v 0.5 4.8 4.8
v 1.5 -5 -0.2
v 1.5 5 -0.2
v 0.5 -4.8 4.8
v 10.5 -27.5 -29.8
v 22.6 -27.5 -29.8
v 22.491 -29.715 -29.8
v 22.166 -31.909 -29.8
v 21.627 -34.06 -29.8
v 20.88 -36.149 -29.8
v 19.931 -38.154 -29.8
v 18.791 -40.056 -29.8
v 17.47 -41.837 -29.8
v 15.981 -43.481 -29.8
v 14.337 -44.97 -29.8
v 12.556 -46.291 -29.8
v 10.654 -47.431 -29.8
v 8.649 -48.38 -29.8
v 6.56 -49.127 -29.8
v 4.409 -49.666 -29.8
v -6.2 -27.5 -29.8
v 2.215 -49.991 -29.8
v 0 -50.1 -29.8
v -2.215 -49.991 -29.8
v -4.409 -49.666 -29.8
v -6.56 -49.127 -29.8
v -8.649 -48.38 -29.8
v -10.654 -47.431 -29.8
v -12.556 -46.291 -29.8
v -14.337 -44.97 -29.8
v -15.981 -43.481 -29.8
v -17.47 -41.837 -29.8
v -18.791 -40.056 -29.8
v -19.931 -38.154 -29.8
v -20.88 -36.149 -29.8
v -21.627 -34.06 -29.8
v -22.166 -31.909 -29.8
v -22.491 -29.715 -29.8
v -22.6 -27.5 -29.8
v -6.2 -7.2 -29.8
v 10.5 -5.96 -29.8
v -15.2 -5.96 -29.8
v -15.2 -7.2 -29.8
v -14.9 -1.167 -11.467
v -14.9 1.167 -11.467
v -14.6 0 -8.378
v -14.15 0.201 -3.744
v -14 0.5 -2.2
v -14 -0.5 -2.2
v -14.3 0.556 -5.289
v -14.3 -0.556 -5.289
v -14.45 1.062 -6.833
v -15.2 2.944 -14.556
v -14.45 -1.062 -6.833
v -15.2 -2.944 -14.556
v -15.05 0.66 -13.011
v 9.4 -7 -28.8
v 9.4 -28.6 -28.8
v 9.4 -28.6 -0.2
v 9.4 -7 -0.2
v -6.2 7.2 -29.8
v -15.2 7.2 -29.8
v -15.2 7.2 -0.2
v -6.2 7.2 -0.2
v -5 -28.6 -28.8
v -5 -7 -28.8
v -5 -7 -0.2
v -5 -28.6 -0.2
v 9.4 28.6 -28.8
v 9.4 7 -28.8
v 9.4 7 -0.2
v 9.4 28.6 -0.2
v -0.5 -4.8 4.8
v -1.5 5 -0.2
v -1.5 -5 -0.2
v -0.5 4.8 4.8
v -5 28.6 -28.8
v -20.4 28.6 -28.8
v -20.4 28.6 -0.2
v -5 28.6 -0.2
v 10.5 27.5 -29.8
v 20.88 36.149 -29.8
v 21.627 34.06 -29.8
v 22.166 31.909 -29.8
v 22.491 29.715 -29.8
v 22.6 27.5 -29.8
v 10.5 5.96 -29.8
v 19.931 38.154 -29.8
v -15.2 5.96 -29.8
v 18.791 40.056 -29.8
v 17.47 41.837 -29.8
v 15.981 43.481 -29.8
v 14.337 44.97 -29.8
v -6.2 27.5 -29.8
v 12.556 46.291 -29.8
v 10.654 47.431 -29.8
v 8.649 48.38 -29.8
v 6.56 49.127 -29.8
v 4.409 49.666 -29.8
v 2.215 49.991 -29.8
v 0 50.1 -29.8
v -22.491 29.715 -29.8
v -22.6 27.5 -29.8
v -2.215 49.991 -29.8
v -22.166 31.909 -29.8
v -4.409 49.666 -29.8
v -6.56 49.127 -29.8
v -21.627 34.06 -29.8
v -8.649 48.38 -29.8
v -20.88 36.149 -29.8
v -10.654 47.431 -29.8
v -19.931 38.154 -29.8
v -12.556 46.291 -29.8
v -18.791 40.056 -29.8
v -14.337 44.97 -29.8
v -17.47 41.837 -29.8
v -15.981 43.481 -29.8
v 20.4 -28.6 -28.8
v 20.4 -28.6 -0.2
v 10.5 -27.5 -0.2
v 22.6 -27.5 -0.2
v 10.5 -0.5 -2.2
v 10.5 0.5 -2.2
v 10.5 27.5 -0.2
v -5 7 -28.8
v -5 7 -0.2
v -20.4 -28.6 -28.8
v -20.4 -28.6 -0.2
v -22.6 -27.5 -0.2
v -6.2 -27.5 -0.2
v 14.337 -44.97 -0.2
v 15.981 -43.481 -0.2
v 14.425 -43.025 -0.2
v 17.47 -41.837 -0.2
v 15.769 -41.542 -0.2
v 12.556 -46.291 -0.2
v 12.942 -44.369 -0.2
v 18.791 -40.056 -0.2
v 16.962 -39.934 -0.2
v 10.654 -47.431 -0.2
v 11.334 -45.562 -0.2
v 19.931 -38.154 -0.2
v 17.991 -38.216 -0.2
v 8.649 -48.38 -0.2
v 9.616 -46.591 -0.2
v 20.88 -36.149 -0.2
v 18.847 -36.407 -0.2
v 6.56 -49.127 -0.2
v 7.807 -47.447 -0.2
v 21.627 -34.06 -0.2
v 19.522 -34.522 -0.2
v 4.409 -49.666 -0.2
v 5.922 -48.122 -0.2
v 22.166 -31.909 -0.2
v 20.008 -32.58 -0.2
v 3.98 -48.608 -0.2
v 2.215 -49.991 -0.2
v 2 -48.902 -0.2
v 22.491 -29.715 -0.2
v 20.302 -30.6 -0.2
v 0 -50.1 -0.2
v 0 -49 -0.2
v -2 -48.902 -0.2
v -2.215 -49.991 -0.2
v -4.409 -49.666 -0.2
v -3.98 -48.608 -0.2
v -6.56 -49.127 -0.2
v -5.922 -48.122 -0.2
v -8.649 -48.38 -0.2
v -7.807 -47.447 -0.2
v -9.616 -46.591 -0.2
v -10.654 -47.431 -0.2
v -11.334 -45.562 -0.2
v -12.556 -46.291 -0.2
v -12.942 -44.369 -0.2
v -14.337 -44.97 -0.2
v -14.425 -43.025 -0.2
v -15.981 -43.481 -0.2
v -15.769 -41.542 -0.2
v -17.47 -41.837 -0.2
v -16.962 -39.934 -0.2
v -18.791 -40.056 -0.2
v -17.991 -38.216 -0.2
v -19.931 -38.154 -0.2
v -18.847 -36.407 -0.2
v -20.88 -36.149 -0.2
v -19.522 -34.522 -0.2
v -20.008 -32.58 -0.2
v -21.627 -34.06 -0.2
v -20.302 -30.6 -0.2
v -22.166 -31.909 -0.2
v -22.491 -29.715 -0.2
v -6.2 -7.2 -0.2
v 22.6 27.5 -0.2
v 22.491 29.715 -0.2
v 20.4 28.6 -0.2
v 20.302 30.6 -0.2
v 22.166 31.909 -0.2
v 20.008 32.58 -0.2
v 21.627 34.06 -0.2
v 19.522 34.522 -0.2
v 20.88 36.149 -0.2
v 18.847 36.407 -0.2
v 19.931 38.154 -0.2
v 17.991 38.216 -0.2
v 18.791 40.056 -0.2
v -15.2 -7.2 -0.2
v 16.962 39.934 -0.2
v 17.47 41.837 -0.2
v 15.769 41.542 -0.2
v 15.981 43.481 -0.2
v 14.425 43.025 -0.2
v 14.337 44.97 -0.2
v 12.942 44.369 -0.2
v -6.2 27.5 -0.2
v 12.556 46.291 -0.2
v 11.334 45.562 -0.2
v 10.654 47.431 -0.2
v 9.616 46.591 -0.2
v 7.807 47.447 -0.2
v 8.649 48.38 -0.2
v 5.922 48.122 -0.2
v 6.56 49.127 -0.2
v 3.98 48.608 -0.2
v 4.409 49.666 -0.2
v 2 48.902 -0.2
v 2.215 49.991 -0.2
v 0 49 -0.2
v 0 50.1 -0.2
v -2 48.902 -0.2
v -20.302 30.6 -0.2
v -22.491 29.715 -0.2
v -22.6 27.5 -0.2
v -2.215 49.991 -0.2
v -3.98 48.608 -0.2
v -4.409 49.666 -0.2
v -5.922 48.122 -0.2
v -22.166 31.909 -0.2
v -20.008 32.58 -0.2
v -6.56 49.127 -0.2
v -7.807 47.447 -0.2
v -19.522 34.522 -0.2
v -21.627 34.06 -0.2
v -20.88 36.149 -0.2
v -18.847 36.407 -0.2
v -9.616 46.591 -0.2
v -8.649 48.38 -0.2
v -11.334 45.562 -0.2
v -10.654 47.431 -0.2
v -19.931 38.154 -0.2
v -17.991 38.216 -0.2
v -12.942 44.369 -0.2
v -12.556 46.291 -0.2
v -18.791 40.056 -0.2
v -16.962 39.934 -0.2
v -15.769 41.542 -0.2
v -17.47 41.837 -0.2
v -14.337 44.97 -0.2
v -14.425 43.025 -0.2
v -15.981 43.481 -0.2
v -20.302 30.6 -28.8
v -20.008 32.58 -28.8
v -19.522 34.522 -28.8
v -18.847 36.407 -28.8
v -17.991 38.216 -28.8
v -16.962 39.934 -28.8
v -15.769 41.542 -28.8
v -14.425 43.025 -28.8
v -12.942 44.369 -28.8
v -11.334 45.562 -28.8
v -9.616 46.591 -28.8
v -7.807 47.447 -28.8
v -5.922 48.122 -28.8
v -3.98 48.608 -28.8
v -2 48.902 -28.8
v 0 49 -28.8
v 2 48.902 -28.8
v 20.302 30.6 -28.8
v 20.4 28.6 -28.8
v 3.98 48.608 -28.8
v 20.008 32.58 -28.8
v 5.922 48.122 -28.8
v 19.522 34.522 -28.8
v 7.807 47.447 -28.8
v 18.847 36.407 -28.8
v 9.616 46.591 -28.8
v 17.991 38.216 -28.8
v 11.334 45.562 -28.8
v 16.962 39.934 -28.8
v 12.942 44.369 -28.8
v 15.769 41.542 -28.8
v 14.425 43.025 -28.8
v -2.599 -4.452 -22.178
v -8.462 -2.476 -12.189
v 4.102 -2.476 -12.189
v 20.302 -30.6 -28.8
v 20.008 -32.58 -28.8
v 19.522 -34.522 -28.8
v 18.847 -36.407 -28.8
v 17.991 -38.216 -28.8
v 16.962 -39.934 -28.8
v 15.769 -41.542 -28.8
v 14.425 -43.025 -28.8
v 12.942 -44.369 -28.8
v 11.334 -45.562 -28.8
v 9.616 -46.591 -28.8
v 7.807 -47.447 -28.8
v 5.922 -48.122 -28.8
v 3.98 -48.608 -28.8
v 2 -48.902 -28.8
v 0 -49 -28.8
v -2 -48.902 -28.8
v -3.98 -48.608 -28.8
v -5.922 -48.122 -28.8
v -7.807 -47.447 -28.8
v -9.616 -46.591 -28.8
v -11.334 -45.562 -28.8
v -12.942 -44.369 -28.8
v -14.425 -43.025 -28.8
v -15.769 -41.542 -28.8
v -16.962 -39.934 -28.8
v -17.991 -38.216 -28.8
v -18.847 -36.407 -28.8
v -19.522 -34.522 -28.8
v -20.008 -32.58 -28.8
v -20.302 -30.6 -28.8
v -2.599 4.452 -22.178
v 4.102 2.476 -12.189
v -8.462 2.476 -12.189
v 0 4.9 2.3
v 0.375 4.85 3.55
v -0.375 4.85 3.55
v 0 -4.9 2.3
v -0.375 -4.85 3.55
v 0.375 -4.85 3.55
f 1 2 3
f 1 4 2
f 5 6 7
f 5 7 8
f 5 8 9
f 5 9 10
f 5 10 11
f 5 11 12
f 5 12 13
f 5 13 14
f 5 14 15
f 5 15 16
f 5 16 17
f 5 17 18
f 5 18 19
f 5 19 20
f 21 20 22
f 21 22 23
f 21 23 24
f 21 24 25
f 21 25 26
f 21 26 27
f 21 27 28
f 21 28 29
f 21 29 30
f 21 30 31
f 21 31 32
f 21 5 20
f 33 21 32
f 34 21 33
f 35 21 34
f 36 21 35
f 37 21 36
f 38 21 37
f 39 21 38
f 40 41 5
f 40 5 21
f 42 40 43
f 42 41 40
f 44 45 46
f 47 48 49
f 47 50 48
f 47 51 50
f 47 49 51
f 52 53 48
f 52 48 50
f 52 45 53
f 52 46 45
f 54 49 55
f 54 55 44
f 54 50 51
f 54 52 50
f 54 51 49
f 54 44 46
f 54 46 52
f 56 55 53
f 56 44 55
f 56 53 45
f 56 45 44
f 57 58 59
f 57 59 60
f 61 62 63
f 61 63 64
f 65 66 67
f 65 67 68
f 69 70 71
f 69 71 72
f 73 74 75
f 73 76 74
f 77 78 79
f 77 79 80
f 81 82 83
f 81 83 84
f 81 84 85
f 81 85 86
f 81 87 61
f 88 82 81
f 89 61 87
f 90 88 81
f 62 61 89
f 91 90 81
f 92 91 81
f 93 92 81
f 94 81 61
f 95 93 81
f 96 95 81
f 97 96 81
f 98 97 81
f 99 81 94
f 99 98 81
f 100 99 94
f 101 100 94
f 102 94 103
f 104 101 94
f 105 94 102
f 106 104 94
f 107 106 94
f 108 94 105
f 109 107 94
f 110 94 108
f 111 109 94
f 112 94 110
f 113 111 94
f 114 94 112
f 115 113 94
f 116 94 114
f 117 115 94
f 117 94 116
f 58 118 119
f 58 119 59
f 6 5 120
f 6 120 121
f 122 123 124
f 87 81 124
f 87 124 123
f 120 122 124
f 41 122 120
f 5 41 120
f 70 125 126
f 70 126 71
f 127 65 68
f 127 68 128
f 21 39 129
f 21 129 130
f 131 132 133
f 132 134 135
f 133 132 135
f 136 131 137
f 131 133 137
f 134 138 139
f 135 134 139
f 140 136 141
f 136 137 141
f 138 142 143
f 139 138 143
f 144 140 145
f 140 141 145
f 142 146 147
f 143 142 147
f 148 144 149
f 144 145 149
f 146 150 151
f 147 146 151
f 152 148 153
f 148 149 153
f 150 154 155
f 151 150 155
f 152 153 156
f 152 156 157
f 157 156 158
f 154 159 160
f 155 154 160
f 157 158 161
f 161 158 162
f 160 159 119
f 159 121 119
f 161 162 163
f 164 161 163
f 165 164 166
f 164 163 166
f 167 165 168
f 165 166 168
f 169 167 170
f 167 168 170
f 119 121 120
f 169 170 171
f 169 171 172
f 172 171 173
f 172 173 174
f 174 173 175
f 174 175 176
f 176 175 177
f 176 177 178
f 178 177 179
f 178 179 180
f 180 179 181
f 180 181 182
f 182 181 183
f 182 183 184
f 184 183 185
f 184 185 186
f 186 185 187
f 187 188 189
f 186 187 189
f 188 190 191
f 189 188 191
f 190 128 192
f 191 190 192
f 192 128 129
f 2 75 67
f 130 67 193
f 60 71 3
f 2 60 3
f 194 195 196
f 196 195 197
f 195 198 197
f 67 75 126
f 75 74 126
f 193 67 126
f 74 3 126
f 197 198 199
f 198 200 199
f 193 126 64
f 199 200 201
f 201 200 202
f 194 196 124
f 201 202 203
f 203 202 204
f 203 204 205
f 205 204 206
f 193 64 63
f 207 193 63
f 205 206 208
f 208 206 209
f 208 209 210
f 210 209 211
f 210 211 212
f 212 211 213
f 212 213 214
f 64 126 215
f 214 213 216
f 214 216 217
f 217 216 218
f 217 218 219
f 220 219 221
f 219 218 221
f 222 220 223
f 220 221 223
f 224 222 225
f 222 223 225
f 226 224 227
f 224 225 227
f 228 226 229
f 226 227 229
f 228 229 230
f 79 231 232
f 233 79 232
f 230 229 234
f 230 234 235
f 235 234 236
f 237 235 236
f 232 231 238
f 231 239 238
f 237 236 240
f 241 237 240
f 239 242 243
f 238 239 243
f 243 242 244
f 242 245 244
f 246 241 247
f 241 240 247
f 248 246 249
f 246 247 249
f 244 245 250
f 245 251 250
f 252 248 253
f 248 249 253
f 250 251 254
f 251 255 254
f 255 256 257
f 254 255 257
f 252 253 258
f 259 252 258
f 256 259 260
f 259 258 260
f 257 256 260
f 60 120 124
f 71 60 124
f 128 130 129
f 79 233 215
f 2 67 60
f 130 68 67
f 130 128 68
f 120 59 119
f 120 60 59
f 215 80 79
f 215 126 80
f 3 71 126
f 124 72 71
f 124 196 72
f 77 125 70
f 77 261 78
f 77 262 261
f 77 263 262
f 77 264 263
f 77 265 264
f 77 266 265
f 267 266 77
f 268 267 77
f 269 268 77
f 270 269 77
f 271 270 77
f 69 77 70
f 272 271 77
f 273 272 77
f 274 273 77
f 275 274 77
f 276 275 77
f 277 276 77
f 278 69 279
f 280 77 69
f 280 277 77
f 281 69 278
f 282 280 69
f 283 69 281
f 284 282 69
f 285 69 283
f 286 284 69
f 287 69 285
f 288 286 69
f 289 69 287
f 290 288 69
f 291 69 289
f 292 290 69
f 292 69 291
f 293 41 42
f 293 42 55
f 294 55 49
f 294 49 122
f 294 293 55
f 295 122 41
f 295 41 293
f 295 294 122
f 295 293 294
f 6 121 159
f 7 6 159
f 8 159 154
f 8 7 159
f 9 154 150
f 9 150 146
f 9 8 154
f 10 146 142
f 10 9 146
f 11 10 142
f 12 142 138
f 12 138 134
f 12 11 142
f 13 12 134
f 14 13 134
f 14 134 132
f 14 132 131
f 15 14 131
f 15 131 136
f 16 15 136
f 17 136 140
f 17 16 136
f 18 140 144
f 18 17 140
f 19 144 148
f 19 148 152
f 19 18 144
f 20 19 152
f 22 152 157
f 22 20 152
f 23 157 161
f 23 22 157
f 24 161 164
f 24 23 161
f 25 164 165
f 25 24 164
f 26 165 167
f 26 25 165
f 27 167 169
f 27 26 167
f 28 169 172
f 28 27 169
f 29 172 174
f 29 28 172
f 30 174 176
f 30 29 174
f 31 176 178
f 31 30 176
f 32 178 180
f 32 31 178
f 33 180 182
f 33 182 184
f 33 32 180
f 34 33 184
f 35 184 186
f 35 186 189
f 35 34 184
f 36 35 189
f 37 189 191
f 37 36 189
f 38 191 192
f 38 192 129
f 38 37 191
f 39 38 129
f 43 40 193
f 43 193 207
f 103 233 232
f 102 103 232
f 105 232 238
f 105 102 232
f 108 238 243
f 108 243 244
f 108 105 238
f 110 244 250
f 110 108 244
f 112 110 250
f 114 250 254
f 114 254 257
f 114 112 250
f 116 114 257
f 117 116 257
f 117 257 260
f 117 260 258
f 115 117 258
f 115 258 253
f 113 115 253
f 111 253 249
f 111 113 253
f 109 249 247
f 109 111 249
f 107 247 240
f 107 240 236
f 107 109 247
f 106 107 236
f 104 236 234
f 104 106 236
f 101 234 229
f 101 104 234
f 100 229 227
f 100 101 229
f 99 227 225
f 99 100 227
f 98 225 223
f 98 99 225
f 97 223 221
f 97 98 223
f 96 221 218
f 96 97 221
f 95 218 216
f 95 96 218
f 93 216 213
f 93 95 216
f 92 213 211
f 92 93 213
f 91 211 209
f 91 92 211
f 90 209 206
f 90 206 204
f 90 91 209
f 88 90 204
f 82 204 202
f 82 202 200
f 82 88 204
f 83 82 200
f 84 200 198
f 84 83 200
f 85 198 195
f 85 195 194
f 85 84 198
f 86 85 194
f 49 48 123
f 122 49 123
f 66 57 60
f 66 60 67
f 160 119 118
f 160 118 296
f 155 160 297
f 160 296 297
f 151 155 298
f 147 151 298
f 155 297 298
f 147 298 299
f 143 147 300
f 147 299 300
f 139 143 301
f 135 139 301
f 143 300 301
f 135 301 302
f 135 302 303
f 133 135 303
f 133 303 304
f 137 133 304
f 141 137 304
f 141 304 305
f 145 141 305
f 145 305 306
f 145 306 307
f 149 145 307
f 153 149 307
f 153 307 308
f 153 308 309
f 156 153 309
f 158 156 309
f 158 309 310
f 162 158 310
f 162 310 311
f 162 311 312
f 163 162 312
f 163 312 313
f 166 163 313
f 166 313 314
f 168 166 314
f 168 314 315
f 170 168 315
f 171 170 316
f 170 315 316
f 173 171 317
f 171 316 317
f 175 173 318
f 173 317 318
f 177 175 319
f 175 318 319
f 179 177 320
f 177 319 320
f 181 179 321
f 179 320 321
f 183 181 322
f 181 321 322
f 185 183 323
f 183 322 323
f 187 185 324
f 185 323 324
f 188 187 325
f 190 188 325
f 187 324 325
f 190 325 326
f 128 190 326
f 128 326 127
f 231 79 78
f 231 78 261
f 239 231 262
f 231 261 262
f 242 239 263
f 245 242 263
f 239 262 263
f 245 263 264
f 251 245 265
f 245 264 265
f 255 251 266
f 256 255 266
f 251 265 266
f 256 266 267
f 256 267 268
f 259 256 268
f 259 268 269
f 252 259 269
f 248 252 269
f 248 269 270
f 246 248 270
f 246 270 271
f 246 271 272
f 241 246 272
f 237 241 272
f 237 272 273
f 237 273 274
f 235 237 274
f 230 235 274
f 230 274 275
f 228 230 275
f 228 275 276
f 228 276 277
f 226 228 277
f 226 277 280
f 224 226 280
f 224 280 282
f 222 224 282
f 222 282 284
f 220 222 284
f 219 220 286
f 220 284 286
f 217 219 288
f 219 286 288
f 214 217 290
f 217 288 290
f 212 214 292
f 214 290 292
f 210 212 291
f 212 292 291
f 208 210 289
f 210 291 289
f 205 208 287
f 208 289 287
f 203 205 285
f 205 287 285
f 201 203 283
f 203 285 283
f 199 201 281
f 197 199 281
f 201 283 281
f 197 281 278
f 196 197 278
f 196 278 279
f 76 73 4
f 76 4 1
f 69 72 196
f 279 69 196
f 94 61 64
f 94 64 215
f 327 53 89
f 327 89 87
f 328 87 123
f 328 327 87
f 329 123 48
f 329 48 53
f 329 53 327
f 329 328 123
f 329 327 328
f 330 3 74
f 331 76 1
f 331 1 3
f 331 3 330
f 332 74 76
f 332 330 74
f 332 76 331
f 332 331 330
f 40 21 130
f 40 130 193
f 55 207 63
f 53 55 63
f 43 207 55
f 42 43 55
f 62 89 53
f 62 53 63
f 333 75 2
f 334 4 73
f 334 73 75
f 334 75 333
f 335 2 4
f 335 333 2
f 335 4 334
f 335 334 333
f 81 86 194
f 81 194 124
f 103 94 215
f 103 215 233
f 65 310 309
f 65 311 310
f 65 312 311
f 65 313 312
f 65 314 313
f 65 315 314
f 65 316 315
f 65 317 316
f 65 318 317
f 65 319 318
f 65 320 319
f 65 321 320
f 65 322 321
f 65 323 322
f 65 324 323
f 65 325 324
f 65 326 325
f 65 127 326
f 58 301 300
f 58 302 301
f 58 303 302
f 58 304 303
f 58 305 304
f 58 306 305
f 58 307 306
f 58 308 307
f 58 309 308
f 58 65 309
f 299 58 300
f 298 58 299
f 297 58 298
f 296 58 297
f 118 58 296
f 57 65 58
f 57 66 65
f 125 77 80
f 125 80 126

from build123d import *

# Parameters (mm, degrees)
SKETCH016_W = 3
SKETCH016_H = 10
SKETCH017_W = 1
SKETCH017_H = 9.6
SKETCH025_W = 28
SKETCH025_H = 1
SKETCH024_W = 30
SKETCH024_H = 12


with BuildPart() as part:
    # Sketch016 → AdditiveLoft section 0
    with BuildSketch(Plane.XY.offset(-0.2)):
        Rectangle(SKETCH016_W, SKETCH016_H)
    # Sketch017 → AdditiveLoft section 1
    with BuildSketch(Plane.XY.offset(4.8)):
        Rectangle(SKETCH017_W, SKETCH017_H)
    loft()

    # AdditivePipe001: sweep along a path in Sketch022
    with BuildLine(Plane.XZ) as additivepipe001_path:
        Line((0, -0.2), (0, -29.8))
    # Sketch023 (on Face1 of AdditiveLoft) → AdditivePipe001 (sweep)
    with BuildSketch(Plane(origin=(0, 0, -0.2), x_dir=(1, 0, 0), z_dir=(0, 0, -1))):
        with BuildLine():
            Line((10.5, 27.5), (10.5, -27.5))
            Line((10.5, -27.5), (22.6, -27.5))
            ThreePointArc((-22.6, -27.5), (0, -50.1), (22.6, -27.5))
            Line((-10.5, -27.5), (-22.6, -27.5))
            Line((-10.5, -27.5), (-6.2, -27.5))
            Line((-6.2, -7.2), (-6.2, -27.5))
            Line((-15.2, -7.2), (-6.2, -7.2))
            Line((-15.2, 7.2), (-15.2, -7.2))
            Line((-15.2, 7.2), (-6.2, 7.2))
            Line((-6.2, 7.2), (-6.2, 27.5))
            Line((-6.2, 27.5), (-10.5, 27.5))
            Line((-10.5, 27.5), (-22.6, 27.5))
            ThreePointArc((22.6, 27.5), (0, 50.1), (-22.6, 27.5))
            Line((10.5, 27.5), (22.6, 27.5))
        make_face()
    sweep(path=additivepipe001_path.line)

    # Sketch025 (on Face1 of AdditivePipe001) → SubtractiveLoft005 section 0
    with BuildSketch(Plane.XY.offset(-2.2)):
        Rectangle(SKETCH025_W, SKETCH025_H)
    # Sketch024 (on Face14 of AdditivePipe001) → SubtractiveLoft005 section 1
    with BuildSketch(Plane(origin=(-15.2, 0, -30), x_dir=(1, 0, 0), z_dir=(0, 0, 1))):
        with Locations((13.5, 0)):
            Rectangle(SKETCH024_W, SKETCH024_H)
    loft(mode=Mode.SUBTRACT)

    # SubtractivePipe011: sweep along a path in Sketch043
    with BuildLine(Plane(origin=(0, 0, 0), x_dir=(0, -1, 0), z_dir=(-1, 0, 0))) as subtractivepipe011_path:
        Line((-15, -0.2), (-15, -28.8))
    # Sketch042 → SubtractivePipe011 (sweep, cut)
    with BuildSketch(Plane.XY.offset(-0.2)):
        with BuildLine():
            Line((-5, -7), (-5, -28.6))
            Line((-13.4, -28.6), (-5, -28.6))
            Line((-20.4, -28.6), (-13.4, -28.6))
            ThreePointArc((-20.4, -28.6), (0, -49), (20.4, -28.6))
            Line((20.4, -28.6), (13.4, -28.6))
            Line((9.4, -28.6), (13.4, -28.6))
            Line((9.4, -28.6), (9.4, -7))
            Line((9.4, -7), (-5, -7))
        make_face()
    sweep(path=subtractivepipe011_path.line, mode=Mode.SUBTRACT)

    # SubtractivePipe012: sweep along a path in Sketch043
    with BuildLine(Plane(origin=(0, 0, 0), x_dir=(0, -1, 0), z_dir=(-1, 0, 0))) as subtractivepipe012_path:
        Line((-15, -0.2), (-15, -28.8))
    # Sketch044 → SubtractivePipe012 (sweep, cut)
    with BuildSketch(Plane.XY.offset(-0.2)):
        with BuildLine():
            Line((-5, 28.6), (-5, 7))
            Line((-5, 7), (9.4, 7))
            Line((9.4, 7), (9.4, 28.6))
            Line((9.4, 28.6), (13.4, 28.6))
            Line((13.4, 28.6), (20.4, 28.6))
            ThreePointArc((20.4, 28.6), (0, 49), (-20.4, 28.6))
            Line((-13.4, 28.6), (-20.4, 28.6))
            Line((-5, 28.6), (-13.4, 28.6))
        make_face()
    sweep(path=subtractivepipe012_path.line, mode=Mode.SUBTRACT)


solid = part.part
